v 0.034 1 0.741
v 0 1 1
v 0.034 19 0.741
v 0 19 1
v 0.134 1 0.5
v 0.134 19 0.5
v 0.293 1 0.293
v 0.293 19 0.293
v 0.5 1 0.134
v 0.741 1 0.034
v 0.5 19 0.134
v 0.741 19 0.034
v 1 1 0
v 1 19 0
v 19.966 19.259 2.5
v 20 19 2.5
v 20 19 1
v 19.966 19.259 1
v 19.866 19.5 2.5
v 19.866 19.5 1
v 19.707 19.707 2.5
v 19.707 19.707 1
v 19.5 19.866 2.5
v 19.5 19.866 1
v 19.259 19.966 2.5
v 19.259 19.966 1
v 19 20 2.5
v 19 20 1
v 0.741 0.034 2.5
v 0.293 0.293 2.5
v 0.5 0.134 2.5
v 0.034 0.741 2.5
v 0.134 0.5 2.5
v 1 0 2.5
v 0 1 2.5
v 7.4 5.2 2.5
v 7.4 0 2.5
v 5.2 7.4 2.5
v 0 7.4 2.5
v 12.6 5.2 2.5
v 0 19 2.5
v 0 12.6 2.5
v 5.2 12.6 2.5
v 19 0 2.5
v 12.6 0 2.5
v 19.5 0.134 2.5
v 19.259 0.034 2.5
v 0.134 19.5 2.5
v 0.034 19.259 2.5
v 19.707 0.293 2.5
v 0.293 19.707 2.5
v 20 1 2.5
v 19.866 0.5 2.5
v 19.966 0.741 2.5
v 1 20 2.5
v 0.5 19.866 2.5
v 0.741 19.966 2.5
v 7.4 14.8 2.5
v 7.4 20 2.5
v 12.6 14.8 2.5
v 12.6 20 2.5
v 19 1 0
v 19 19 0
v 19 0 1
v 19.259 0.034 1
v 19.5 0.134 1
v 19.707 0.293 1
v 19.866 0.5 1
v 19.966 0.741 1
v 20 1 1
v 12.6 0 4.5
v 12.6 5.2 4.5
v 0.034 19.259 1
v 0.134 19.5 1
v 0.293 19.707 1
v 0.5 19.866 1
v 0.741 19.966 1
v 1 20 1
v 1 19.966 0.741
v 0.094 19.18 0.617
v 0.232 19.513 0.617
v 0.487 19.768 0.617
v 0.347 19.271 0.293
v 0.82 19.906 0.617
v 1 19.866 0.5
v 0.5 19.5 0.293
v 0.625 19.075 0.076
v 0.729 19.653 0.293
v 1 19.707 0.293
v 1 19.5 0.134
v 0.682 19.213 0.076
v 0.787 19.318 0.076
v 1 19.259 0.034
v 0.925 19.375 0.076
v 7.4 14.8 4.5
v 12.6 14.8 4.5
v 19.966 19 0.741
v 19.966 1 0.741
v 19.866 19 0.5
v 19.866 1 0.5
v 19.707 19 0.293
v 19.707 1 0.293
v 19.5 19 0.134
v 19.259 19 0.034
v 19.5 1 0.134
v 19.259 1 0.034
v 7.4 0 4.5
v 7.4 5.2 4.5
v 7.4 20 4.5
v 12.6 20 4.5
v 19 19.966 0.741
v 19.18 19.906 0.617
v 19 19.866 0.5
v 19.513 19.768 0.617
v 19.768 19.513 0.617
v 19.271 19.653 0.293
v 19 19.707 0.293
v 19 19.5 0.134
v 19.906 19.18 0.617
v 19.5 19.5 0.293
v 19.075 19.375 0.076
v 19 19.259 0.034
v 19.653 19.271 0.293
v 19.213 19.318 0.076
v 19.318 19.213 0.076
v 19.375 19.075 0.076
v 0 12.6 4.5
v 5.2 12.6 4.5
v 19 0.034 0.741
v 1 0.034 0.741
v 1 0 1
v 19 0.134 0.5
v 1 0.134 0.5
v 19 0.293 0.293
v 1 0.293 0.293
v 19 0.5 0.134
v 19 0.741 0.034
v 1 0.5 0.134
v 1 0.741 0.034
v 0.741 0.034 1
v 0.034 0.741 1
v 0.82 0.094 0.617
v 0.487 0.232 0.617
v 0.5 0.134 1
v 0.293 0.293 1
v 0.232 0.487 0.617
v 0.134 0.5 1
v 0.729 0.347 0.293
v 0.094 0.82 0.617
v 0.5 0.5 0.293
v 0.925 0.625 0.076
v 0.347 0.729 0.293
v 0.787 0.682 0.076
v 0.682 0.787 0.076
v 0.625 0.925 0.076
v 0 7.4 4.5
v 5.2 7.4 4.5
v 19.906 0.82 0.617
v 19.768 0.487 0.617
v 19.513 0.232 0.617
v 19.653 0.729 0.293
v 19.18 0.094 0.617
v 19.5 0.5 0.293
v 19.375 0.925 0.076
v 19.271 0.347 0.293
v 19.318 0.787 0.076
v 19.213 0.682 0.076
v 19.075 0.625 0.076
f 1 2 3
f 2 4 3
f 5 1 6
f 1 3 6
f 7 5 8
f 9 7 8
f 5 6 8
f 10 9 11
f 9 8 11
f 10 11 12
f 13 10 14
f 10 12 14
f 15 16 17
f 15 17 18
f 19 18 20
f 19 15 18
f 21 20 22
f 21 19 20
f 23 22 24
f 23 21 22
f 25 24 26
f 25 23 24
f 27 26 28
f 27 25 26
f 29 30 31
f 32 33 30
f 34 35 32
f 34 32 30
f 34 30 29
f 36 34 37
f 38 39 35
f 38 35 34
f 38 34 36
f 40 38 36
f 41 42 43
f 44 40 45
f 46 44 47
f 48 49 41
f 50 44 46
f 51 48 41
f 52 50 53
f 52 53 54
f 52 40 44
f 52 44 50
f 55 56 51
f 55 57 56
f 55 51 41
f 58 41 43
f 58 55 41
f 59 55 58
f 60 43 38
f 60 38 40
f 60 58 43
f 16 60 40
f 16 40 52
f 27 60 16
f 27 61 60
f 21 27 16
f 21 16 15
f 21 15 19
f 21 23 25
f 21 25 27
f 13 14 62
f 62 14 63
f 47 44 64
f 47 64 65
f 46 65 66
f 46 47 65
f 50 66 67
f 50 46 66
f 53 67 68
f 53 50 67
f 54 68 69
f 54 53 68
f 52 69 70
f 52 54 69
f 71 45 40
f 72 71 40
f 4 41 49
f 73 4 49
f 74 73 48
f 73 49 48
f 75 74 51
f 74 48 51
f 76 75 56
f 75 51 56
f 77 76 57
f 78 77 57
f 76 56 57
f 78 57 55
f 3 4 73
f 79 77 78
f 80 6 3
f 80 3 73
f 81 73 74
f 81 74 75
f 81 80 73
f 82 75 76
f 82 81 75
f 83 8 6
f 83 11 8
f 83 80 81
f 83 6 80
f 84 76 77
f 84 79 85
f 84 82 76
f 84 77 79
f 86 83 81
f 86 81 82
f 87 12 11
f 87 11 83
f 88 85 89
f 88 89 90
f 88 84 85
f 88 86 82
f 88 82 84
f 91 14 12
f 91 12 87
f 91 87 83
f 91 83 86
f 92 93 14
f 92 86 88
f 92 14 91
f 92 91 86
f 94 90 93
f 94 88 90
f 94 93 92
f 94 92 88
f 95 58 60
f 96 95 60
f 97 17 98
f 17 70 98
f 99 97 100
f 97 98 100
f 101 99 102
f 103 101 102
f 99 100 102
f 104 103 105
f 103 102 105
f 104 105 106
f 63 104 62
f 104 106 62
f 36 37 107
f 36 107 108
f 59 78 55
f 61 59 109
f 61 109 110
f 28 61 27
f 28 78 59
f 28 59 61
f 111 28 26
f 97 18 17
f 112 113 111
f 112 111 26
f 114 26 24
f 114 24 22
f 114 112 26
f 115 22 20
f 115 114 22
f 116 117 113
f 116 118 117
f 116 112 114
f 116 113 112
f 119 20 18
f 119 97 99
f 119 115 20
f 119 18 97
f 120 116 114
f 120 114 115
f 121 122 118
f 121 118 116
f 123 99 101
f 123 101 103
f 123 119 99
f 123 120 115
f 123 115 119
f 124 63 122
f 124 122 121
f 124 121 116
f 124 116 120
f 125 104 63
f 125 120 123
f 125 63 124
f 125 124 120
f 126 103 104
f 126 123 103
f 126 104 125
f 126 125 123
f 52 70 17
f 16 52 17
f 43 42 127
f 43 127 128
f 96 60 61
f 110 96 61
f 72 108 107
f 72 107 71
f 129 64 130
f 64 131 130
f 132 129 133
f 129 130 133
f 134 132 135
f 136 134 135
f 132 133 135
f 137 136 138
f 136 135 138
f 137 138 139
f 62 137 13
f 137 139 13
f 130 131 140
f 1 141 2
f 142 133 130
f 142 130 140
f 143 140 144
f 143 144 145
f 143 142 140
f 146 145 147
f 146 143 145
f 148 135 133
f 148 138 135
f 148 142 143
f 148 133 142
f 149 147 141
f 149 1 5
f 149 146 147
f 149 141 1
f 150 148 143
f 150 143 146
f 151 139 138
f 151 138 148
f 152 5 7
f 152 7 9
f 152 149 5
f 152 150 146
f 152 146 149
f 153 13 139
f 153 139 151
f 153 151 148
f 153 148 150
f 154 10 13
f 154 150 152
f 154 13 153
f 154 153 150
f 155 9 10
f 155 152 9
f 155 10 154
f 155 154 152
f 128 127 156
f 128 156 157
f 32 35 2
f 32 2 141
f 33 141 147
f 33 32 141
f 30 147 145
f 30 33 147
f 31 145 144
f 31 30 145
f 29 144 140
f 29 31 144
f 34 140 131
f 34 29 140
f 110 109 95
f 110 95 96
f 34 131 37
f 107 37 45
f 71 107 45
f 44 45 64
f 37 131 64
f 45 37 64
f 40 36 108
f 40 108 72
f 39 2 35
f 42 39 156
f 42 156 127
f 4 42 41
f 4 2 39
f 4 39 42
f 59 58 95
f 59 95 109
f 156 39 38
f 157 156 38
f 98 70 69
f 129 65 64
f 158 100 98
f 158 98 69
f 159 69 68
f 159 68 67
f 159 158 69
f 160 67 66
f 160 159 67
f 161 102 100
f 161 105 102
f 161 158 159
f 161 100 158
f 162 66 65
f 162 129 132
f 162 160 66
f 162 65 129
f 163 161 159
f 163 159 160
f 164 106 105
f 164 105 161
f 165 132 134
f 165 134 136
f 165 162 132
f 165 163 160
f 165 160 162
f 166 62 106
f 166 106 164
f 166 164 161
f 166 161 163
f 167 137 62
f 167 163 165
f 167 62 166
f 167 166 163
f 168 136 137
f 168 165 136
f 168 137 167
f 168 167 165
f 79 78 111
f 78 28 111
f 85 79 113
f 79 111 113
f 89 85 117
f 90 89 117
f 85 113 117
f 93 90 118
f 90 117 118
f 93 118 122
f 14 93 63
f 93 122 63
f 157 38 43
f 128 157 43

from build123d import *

# Parameters (mm, degrees)
BOX001_W     = 5.2
BOX001_H     = 5.2
BOX001_DEPTH = 3
BOX003_W     = 5.2
BOX003_H     = 5.2
BOX003_DEPTH = 3
BOX002_W     = 5.2
BOX002_H     = 5.2
BOX002_DEPTH = 3
BOX_W        = 20
BOX_H        = 20
BOX_DEPTH    = 2.5
FILLET_R     = 1
FILLET001_R  = 1


with BuildPart() as w_rfel001:
    # Box001 → Box001 (new body)
    with BuildSketch(Plane(origin=(7.4, 0, 1.5), x_dir=(1, 0, 0), z_dir=(0, 0, 1))):
        with Locations((2.6, 2.6)):
            Rectangle(BOX001_W, BOX001_H)
    extrude(amount=BOX001_DEPTH)


with BuildPart() as w_rfel003:
    # Box003 → Box003 (new body)
    with BuildSketch(Plane(origin=(0, 7.4, 1.5), x_dir=(1, 0, 0), z_dir=(0, 0, 1))):
        with Locations((2.6, 2.6)):
            Rectangle(BOX003_W, BOX003_H)
    extrude(amount=BOX003_DEPTH)


with BuildPart() as w_rfel002:
    # Box002 → Box002 (new body)
    with BuildSketch(Plane(origin=(7.4, 14.8, 1.5), x_dir=(1, 0, 0), z_dir=(0, 0, 1))):
        with Locations((2.6, 2.6)):
            Rectangle(BOX002_W, BOX002_H)
    extrude(amount=BOX002_DEPTH)


with BuildPart() as fusion:
    # Box → Box (new body)
    with BuildSketch(Plane.XY):
        with Locations((10, 10)):
            Rectangle(BOX_W, BOX_H)
    extrude(amount=BOX_DEPTH)

    # Fillet
    fillet_edges = [fusion.edges().sort_by_distance(p)[0] for p in [
        (0, 0, 1.25),
        (0, 20, 1.25),
        (20, 0, 1.25),
        (20, 20, 1.25),
    ]]
    fillet(fillet_edges, radius=FILLET_R)

    # Fillet001
    fillet001_edges = [fusion.edges().sort_by_distance(p)[0] for p in [
        (0, 10, 0),
        (0.292893, 0.292893, 0),
        (0.292893, 19.707107, 0),
        (10, 0, 0),
        (10, 20, 0),
        (19.707107, 0.292893, 0),
        (19.707107, 19.707107, 0),
        (20, 10, 0),
    ]]
    fillet(fillet001_edges, radius=FILLET001_R)

    # Fusion: union Würfel001, Würfel003, Würfel002
    add(w_rfel001.part)
    add(w_rfel003.part)
    add(w_rfel002.part)


solid = fusion.part
